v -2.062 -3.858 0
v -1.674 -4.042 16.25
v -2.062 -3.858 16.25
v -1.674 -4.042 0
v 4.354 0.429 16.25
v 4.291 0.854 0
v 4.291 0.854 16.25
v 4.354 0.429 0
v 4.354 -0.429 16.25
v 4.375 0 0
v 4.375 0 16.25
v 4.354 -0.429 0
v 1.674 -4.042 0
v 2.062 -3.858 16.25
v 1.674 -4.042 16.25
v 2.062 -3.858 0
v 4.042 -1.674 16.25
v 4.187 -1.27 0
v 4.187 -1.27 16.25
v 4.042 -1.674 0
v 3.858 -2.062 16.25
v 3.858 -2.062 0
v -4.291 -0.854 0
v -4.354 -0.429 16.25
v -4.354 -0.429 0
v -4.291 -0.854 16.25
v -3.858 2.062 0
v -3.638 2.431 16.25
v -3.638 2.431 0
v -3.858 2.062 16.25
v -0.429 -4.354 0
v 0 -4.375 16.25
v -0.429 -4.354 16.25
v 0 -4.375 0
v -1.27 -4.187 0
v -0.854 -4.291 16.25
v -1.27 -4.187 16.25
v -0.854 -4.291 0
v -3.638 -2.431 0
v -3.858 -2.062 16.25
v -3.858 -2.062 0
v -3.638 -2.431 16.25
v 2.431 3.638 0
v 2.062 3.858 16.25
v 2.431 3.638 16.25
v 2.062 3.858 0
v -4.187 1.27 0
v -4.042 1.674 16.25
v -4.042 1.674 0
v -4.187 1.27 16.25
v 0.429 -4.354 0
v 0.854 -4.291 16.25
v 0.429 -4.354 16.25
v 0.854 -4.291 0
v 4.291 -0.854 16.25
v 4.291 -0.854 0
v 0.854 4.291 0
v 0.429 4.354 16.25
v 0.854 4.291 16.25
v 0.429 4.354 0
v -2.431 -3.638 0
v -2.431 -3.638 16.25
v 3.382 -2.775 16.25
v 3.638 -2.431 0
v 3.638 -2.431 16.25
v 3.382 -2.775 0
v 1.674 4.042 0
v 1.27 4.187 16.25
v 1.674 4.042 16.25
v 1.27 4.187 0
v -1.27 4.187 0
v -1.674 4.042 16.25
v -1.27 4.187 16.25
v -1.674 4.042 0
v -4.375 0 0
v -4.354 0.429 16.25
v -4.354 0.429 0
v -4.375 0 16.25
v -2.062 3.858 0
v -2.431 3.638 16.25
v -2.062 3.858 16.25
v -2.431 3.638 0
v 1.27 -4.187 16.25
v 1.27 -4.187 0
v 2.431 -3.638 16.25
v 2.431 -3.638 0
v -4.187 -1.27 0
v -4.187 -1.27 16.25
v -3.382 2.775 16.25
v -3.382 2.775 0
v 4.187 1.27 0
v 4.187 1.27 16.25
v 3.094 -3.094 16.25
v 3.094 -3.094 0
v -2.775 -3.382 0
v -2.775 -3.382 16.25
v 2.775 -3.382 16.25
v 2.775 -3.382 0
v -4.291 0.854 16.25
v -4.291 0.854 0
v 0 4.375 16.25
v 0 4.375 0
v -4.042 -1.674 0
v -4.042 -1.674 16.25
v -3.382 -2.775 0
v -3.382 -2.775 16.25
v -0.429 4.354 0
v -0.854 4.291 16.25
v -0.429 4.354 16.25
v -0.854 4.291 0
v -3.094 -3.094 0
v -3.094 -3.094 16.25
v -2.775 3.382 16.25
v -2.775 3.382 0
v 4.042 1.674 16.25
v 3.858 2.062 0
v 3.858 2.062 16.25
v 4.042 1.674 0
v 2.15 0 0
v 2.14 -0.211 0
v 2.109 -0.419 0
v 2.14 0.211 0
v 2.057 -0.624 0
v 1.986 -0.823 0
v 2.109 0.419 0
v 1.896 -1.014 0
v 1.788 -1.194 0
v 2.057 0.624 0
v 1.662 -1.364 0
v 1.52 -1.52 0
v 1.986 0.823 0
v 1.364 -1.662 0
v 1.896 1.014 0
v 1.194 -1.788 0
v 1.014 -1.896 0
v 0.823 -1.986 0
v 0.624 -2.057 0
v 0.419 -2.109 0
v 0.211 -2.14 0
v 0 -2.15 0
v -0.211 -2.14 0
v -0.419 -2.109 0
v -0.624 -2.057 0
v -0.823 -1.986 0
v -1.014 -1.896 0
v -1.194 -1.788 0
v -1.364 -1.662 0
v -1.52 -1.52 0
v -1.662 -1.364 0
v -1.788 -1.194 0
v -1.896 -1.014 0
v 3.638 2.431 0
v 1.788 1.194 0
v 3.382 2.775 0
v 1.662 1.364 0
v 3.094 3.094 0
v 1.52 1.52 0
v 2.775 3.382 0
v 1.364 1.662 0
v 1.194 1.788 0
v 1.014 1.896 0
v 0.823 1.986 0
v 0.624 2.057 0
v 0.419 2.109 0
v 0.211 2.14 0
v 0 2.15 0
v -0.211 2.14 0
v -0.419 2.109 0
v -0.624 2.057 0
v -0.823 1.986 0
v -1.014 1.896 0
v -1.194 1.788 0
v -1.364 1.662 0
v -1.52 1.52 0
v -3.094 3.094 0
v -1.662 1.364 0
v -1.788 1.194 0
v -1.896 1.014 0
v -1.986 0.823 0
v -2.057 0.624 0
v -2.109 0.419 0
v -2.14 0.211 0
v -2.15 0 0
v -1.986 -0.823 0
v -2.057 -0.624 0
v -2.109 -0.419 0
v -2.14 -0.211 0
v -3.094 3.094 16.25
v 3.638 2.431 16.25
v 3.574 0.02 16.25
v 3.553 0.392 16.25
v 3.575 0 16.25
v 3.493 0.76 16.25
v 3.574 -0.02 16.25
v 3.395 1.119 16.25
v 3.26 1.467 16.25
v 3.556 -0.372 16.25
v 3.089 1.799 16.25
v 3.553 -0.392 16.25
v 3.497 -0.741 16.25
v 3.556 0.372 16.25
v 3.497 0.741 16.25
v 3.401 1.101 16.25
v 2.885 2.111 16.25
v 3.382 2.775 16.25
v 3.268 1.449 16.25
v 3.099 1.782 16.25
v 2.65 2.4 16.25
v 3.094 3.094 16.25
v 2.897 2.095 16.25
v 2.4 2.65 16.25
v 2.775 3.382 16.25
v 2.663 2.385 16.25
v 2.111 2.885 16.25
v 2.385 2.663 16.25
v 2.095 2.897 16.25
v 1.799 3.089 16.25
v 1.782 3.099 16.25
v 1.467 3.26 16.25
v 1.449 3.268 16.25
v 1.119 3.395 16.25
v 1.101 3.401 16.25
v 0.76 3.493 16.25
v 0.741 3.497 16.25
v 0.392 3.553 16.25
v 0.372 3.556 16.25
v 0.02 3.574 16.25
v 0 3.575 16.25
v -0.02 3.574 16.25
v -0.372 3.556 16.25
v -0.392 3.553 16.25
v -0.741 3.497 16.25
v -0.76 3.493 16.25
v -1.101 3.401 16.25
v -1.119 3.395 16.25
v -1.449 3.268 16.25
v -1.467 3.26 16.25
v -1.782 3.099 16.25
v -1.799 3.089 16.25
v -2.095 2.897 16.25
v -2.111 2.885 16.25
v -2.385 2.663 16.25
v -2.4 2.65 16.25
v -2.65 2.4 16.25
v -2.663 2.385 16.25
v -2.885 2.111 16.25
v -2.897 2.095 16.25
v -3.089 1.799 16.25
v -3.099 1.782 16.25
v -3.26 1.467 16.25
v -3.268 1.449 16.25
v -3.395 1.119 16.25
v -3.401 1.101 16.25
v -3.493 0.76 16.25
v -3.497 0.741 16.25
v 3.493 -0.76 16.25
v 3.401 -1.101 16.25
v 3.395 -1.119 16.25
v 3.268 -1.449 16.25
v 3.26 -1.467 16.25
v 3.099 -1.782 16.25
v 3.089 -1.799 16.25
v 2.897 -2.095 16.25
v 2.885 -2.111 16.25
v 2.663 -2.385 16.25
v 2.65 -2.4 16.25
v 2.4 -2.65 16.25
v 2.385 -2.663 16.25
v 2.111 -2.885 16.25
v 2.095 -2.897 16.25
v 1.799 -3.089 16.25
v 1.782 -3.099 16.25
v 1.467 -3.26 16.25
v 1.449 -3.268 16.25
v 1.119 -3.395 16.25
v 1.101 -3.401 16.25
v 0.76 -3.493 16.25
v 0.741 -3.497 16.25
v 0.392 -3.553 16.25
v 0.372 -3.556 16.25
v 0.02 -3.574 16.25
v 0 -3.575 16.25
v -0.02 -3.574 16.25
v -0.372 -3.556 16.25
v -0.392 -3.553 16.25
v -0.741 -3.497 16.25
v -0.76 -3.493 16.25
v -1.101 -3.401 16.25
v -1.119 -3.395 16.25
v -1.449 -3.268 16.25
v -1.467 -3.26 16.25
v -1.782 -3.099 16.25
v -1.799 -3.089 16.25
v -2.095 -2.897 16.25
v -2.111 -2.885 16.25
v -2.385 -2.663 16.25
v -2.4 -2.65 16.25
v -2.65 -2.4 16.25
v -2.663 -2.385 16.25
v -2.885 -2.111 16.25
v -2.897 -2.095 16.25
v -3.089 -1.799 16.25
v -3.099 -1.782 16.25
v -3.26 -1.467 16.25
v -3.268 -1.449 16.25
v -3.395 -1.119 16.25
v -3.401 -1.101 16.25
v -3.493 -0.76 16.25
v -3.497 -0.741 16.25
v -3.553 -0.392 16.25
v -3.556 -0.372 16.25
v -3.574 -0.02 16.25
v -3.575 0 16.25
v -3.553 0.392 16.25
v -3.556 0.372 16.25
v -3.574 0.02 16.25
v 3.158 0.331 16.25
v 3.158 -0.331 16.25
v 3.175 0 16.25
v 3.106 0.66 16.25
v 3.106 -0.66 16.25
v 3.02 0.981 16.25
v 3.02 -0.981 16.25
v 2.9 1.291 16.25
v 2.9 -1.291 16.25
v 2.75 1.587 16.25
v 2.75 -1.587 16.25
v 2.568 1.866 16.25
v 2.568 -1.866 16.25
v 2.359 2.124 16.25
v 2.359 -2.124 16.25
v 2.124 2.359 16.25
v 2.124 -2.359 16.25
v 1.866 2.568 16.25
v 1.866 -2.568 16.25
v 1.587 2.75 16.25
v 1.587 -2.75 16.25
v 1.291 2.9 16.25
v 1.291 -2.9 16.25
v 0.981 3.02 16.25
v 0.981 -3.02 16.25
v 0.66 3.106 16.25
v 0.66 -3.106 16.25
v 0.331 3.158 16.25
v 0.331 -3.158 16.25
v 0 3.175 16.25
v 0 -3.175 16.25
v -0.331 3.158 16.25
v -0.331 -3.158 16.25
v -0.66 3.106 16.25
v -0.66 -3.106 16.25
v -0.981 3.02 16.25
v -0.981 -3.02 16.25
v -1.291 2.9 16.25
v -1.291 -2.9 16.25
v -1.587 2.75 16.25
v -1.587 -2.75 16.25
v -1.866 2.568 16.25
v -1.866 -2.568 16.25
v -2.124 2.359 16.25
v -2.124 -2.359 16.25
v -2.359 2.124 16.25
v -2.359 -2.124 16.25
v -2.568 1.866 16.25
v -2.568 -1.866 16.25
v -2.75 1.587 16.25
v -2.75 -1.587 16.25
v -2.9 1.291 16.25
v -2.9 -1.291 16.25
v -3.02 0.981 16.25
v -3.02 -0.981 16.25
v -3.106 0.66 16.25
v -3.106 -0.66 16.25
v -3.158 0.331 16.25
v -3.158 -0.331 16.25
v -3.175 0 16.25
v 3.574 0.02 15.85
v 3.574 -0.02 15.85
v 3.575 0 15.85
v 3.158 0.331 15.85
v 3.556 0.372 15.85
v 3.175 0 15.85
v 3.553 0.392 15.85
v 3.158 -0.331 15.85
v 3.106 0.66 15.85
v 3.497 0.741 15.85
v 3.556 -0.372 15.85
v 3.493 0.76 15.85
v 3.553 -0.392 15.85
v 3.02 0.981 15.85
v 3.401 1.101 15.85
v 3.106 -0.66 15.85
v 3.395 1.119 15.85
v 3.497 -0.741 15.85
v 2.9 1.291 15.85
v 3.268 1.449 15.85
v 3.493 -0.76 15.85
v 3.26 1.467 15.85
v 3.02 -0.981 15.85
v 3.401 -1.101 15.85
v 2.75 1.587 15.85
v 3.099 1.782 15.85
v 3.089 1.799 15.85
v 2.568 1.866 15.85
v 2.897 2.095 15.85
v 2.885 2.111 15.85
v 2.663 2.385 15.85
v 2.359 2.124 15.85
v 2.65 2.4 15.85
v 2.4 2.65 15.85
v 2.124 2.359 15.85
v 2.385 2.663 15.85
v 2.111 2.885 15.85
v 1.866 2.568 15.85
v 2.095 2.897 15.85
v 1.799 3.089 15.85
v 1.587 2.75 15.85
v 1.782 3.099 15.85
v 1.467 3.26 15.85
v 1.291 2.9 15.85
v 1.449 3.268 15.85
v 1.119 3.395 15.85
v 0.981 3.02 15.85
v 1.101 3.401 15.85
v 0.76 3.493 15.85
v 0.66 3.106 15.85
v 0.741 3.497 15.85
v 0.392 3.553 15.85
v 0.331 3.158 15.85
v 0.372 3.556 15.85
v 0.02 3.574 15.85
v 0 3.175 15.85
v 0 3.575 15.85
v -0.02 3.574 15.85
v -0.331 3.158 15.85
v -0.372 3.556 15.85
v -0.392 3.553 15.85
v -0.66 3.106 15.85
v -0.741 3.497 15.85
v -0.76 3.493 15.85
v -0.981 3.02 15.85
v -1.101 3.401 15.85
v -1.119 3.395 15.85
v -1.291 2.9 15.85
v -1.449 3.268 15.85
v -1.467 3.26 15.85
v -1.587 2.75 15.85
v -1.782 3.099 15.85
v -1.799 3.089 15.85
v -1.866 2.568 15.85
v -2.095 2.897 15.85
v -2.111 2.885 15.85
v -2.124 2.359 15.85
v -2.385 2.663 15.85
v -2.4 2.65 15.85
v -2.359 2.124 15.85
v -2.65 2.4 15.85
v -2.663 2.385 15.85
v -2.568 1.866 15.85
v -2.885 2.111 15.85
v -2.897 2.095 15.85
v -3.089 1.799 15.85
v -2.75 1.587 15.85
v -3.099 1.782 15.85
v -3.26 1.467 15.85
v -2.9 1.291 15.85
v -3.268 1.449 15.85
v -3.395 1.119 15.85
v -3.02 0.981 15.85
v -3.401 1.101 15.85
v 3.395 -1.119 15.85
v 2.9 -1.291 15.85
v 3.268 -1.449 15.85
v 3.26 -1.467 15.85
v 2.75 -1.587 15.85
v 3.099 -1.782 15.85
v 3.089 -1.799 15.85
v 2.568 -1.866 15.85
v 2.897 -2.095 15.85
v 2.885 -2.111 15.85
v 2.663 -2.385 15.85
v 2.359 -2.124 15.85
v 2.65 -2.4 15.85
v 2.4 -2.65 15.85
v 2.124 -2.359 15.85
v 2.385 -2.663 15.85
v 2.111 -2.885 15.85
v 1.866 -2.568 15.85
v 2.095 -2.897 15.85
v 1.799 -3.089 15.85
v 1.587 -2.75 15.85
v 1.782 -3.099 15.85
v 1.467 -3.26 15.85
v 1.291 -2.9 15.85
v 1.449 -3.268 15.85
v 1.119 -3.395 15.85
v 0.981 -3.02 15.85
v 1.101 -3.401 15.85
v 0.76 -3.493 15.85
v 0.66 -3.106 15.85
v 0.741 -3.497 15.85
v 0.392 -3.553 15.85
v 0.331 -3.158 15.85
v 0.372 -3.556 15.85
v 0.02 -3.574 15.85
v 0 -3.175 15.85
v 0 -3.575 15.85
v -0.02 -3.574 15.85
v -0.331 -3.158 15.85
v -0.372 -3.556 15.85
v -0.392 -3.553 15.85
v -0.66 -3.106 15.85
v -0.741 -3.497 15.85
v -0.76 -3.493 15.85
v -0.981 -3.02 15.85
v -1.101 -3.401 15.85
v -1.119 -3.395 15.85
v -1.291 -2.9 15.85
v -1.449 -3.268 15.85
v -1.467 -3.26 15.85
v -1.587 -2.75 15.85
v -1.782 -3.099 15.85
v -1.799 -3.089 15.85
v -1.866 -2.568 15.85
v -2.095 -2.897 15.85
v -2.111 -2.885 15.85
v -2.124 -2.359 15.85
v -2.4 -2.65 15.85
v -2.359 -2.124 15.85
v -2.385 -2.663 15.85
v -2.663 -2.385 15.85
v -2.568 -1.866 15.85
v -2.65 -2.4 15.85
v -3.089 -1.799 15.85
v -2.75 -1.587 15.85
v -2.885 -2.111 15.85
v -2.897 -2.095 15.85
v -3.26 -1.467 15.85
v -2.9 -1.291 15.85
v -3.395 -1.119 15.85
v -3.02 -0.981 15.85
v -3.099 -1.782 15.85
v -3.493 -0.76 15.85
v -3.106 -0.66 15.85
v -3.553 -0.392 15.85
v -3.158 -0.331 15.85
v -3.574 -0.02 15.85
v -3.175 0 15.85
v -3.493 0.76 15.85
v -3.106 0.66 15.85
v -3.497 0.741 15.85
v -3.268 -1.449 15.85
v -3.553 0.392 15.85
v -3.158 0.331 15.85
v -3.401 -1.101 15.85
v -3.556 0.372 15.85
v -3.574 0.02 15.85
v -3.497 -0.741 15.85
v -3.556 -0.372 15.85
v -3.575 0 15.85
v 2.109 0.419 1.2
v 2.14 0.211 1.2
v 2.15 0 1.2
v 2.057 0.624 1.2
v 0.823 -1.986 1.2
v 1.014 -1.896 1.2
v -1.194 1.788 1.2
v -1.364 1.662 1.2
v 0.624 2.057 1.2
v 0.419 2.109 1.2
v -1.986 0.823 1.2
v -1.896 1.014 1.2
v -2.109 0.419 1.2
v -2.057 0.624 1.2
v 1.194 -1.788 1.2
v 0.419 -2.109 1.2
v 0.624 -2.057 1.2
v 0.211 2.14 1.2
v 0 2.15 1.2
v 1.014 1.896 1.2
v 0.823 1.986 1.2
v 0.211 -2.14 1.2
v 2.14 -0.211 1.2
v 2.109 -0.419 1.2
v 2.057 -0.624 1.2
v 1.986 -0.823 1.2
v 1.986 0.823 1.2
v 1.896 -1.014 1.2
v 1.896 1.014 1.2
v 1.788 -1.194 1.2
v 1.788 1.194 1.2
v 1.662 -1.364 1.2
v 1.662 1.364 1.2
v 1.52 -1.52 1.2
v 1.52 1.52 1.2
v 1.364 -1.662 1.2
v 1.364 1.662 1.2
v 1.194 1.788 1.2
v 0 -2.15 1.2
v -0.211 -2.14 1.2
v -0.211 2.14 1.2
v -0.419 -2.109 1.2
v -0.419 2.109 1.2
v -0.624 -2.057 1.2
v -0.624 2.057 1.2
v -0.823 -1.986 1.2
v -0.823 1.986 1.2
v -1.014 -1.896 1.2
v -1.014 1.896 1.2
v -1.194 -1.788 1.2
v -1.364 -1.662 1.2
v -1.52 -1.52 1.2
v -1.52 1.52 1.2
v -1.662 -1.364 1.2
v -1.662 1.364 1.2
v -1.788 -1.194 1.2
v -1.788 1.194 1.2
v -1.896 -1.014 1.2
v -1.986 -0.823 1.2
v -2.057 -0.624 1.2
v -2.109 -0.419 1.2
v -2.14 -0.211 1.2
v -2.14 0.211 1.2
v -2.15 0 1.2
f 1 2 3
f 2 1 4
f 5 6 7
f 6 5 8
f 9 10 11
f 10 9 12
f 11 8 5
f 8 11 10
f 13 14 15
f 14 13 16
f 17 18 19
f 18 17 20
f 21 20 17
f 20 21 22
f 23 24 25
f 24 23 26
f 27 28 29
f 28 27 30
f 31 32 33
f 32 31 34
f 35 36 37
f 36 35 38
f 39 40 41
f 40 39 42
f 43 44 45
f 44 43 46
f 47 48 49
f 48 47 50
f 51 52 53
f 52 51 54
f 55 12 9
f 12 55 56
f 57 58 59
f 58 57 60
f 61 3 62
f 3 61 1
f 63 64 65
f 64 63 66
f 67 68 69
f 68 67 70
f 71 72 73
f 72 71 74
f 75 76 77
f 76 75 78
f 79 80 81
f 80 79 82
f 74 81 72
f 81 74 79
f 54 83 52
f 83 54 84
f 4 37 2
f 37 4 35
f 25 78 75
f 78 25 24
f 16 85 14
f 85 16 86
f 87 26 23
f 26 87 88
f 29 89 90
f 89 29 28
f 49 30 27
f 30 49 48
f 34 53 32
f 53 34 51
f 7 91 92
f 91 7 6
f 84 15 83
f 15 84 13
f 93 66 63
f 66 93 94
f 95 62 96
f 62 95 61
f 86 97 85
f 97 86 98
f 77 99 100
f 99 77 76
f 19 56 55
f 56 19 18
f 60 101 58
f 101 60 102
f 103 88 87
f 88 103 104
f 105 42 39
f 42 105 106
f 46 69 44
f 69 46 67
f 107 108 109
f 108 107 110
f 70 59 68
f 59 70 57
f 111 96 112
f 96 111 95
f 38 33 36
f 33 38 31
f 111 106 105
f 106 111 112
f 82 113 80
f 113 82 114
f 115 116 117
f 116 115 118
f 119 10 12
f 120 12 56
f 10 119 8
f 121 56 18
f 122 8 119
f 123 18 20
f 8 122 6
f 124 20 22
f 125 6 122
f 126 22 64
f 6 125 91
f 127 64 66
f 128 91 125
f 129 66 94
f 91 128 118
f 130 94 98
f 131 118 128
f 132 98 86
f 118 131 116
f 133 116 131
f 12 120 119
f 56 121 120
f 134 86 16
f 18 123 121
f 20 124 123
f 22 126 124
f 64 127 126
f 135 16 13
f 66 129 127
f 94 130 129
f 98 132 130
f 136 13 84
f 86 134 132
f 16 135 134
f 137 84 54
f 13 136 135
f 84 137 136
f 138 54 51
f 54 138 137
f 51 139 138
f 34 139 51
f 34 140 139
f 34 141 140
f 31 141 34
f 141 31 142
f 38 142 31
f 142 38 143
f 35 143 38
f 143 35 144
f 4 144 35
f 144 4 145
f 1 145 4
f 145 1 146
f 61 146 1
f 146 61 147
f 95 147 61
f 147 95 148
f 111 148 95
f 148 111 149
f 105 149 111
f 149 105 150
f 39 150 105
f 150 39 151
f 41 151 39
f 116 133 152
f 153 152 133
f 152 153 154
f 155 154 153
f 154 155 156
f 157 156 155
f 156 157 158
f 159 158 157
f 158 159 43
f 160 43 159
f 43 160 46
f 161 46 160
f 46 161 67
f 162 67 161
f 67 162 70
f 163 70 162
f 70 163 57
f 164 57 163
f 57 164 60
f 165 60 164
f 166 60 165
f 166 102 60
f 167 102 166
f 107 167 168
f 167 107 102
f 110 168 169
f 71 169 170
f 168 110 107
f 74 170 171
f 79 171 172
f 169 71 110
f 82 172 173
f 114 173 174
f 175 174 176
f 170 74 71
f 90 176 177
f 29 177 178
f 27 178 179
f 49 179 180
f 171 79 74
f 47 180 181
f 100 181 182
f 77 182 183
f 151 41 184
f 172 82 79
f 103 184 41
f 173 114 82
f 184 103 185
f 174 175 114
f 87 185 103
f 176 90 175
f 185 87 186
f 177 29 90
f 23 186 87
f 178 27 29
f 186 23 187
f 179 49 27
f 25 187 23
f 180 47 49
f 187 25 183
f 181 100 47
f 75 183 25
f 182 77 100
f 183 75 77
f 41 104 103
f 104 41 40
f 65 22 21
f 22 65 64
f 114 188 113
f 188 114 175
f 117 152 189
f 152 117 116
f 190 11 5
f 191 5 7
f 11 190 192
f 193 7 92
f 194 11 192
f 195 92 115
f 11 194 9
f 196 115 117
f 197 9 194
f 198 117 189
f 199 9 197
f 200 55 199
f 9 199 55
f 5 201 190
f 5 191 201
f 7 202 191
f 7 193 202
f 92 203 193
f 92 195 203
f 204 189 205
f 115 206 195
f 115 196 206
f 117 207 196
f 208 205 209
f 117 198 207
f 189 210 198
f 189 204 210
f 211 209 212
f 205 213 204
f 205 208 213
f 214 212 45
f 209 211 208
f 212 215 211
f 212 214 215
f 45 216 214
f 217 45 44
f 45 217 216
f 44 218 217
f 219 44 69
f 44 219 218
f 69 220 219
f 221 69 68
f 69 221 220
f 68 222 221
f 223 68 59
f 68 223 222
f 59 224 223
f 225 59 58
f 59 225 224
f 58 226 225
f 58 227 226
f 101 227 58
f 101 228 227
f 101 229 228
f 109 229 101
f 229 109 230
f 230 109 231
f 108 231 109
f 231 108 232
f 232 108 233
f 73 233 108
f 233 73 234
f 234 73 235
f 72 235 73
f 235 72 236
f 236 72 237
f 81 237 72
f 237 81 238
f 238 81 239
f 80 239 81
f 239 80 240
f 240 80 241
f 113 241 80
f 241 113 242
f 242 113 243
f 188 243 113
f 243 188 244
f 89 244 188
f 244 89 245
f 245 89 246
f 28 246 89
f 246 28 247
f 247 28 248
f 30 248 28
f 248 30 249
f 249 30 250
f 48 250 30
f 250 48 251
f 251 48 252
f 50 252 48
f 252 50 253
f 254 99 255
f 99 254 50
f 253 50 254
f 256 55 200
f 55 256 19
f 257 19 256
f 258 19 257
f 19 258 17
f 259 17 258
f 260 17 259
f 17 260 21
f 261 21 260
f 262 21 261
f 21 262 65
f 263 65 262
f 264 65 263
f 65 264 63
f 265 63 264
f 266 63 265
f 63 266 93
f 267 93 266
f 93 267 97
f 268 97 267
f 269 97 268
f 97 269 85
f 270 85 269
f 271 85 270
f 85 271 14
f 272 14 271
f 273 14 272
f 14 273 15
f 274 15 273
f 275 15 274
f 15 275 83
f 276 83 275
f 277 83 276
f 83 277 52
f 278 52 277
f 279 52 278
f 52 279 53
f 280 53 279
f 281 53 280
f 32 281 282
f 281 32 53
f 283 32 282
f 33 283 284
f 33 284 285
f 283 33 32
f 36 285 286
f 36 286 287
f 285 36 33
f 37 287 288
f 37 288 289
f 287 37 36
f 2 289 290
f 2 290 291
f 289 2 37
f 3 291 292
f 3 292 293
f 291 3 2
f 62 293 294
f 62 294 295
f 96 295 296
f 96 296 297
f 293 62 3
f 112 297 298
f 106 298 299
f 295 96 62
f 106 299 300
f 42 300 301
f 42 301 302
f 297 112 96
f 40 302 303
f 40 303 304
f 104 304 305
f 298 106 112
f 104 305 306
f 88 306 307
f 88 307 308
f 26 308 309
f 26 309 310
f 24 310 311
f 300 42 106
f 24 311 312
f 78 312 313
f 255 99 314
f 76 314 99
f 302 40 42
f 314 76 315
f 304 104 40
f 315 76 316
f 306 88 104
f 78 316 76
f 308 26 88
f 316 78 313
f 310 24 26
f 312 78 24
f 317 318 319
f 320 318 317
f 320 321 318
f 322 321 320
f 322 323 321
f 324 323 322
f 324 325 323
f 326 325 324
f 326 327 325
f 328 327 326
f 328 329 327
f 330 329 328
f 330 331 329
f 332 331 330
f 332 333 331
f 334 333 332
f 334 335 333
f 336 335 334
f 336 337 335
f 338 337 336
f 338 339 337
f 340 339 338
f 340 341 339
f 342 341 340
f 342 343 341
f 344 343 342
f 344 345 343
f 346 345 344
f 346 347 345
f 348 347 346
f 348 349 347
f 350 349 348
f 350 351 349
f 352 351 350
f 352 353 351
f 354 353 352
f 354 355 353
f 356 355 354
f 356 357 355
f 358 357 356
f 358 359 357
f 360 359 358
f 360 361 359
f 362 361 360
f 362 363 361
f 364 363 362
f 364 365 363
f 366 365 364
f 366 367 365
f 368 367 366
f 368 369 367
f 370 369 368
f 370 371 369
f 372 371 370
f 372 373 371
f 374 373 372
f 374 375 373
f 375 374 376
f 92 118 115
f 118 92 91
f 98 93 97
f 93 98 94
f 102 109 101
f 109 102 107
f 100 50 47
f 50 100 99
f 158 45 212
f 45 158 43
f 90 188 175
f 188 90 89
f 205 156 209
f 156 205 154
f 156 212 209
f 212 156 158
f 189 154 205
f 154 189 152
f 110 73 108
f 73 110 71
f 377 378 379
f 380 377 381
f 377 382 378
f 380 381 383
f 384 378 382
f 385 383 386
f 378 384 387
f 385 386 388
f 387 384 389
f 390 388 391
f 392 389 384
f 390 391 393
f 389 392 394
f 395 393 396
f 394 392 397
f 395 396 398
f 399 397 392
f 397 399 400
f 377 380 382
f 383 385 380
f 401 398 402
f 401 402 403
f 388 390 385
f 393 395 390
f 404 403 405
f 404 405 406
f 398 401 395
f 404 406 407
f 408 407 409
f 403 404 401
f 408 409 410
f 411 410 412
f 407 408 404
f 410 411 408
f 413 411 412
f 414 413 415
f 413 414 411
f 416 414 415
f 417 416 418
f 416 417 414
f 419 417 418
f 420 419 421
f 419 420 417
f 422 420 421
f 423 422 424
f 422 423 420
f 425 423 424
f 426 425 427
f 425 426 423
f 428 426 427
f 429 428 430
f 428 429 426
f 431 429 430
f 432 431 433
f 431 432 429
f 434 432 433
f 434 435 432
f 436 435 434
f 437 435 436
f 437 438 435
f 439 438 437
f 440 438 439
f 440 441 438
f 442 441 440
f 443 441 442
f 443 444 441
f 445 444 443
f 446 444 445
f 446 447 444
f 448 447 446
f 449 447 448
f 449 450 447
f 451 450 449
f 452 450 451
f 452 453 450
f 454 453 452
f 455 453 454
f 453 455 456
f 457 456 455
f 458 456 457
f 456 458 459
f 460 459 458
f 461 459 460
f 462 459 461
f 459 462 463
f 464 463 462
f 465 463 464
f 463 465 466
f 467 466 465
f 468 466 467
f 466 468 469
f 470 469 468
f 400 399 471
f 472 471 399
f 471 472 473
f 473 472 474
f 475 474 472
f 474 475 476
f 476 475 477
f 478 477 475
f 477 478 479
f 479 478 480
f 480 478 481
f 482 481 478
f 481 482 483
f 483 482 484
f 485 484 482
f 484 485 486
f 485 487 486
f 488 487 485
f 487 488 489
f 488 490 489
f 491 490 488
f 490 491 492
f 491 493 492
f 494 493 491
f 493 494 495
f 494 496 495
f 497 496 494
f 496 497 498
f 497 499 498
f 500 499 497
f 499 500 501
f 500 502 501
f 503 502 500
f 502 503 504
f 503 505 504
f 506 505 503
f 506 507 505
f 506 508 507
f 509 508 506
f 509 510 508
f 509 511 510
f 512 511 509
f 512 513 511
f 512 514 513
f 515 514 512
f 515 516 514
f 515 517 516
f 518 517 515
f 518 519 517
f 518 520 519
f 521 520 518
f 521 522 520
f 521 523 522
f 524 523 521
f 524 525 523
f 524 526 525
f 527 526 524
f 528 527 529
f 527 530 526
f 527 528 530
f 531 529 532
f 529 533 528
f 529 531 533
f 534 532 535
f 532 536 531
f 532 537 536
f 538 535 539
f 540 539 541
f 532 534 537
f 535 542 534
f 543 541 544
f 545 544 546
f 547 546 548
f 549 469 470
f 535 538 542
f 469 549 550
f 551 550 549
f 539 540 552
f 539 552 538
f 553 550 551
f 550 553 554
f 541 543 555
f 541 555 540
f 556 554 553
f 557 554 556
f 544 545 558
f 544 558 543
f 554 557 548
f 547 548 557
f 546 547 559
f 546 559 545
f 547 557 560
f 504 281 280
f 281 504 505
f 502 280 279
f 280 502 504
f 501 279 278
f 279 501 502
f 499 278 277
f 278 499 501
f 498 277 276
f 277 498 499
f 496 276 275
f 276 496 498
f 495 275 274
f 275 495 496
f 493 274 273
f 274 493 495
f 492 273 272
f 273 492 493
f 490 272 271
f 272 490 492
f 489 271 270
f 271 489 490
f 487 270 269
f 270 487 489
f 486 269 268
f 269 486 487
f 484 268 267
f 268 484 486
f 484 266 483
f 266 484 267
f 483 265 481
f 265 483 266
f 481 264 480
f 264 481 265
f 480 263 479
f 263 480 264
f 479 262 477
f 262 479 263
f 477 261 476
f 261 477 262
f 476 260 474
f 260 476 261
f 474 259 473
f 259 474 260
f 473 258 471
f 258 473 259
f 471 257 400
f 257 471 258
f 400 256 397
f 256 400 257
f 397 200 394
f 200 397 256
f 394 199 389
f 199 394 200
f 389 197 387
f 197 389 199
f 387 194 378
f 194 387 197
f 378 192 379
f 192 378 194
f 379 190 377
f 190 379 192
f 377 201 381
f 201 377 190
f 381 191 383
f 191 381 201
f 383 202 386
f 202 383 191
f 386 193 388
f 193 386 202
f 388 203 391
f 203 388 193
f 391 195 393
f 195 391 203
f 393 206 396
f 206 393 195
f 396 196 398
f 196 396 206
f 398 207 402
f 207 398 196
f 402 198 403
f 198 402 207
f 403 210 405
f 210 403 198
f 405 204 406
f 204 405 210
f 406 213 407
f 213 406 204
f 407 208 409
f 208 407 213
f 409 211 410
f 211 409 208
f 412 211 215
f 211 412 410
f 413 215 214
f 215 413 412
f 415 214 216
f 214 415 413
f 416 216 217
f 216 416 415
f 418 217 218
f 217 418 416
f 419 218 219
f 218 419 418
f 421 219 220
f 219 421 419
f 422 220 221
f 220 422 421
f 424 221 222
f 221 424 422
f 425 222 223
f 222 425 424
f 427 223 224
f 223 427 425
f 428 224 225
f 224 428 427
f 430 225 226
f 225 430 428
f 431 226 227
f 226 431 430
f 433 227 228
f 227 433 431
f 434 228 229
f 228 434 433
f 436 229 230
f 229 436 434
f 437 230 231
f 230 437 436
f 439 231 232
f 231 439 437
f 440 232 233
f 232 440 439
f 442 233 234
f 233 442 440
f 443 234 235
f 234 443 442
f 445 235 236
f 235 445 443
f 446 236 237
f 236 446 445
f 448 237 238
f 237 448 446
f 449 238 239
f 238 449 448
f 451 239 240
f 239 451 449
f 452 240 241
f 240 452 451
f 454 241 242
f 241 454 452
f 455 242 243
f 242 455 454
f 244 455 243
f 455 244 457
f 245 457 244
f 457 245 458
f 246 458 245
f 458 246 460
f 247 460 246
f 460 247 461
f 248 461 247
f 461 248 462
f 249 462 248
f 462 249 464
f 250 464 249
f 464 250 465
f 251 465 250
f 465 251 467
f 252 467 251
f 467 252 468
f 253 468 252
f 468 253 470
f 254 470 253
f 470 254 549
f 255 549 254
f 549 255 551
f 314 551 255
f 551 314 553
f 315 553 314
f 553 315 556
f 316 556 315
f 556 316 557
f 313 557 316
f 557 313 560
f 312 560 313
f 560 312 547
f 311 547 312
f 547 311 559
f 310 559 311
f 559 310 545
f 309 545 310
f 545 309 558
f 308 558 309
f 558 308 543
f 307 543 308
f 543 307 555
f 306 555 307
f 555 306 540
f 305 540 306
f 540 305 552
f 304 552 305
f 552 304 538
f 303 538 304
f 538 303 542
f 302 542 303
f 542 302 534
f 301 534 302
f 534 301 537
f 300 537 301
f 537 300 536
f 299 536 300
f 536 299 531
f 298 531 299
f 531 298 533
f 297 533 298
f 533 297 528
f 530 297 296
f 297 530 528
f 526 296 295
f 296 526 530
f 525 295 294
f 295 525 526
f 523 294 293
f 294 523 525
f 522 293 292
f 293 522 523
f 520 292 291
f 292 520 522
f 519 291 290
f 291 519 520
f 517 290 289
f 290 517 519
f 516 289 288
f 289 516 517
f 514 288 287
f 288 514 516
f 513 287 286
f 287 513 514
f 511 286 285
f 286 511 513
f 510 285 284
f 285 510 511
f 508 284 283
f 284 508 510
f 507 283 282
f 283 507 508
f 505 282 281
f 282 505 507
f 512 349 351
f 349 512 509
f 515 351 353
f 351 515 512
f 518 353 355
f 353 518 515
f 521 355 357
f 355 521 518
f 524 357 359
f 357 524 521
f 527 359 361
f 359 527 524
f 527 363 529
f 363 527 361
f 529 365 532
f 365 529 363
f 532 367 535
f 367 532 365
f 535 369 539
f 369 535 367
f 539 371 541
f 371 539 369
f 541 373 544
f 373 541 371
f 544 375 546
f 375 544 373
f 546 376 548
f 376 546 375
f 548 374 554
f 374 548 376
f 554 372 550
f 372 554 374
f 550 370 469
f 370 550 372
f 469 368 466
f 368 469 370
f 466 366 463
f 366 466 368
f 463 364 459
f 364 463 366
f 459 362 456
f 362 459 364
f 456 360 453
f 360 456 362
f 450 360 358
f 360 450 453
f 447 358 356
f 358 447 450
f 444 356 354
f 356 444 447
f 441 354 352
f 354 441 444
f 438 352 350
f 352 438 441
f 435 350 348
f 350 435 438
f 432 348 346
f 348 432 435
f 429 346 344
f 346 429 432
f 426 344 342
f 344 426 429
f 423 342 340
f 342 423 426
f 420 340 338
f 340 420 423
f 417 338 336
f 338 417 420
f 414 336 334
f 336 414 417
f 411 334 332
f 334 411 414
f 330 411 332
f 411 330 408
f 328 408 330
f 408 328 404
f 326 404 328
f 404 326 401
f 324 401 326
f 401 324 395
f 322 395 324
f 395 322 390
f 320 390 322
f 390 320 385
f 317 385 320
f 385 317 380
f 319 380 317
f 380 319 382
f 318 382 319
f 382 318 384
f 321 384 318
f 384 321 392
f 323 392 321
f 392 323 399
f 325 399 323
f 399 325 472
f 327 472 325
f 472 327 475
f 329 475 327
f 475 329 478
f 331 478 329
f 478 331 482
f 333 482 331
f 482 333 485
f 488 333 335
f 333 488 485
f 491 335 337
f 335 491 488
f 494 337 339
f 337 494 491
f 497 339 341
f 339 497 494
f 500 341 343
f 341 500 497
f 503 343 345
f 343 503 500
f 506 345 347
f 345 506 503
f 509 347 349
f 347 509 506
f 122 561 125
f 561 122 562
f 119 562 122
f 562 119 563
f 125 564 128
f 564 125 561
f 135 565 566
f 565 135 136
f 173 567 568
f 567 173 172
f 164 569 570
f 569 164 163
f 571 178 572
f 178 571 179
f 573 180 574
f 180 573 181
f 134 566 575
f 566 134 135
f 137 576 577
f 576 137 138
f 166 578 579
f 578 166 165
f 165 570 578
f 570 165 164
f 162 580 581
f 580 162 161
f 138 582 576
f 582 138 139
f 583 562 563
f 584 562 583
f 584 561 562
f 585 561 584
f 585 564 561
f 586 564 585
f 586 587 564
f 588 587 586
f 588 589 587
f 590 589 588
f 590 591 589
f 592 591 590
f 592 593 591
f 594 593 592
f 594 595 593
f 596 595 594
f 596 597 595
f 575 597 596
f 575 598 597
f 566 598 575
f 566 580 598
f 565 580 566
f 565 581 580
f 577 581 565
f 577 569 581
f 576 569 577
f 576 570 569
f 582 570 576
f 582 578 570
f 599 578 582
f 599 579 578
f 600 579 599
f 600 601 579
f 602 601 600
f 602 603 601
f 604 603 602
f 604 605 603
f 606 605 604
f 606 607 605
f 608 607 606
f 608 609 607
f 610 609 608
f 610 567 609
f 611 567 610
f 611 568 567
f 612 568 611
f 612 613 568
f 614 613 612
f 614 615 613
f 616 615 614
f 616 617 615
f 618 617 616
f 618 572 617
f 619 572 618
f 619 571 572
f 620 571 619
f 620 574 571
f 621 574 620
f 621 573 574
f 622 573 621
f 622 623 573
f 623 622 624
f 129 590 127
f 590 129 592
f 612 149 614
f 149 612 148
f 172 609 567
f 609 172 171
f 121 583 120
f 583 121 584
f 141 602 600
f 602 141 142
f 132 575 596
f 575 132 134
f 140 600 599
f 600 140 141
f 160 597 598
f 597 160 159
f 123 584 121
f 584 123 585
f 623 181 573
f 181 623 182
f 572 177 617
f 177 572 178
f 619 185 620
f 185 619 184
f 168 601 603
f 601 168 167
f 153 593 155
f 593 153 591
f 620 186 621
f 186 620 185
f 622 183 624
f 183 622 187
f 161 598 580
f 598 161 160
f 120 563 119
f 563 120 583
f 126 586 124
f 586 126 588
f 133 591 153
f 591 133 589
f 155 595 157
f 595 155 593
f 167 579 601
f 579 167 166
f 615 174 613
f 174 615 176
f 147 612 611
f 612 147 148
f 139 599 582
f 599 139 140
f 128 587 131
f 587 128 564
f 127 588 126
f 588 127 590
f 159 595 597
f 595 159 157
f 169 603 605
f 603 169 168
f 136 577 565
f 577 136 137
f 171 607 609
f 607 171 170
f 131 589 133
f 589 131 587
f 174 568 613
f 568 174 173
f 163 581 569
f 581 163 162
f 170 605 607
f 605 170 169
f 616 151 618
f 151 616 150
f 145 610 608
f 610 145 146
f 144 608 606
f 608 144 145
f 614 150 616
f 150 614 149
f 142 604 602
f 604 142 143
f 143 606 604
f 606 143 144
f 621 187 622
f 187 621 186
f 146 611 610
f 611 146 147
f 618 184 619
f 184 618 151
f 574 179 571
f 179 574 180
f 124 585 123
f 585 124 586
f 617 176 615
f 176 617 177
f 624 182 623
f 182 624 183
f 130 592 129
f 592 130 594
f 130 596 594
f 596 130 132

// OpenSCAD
// kitchen / bar_stool — a round bar stool token, with a seat ring engraved on
// top and nothing else.
//
// Diameter is the real-world seat size in cm: a bar stool seat is a narrow
// round disc, commonly 30-40 cm across. Height is the real seat height: a bar stool
// puts the seat up at a raised worktop / breakfast bar, so it stands taller than a
// dining chair and is shrunk by the plan scale like the footprint (see printed_h()
// in lib/common.scad).

include <../lib/common.scad>

Diameter = 35;  // cm
Height   = 65;  // cm — seat height at a breakfast bar

// the printed height, mm: Height at the plan scale
Print_h = printed_h(Height);

Show_seat = true;
// Magnet pockets in the bottom face (0 = none). A 35 cm disc is only 8.75 mm
// across at 1:40 — just enough for the 4 mm disc; a smaller stool drops to the
// 2 mm one on its own (see Magnet_* in lib/common.scad).
Magnets = 1;

bar_stool();

module bar_stool() {
    difference() {
        footprint_round(Diameter, Print_h);
        // a seat ring set in from the rim, as big as the top face allows
        if (Show_seat)
            detail(Print_h);
        if (Magnets > 0)
            magnets(Diameter, Diameter, Magnets);
    }
}

// The seat ring, cut into the top face at the same depth as label() — a single
// stroke_arc traced just inside the rim, kept Symbol_margin off the edge and
// Symbol_stroke wide, centred on the origin.
module detail(top_z, depth = Label_depth) {
    r = cm(Diameter) / 2 - Symbol_margin - Symbol_stroke / 2;
    translate([0, 0, top_z - depth])
        linear_extrude(height = depth + 0.01)
            stroke_arc(r, 0, 360, Symbol_stroke);
}
